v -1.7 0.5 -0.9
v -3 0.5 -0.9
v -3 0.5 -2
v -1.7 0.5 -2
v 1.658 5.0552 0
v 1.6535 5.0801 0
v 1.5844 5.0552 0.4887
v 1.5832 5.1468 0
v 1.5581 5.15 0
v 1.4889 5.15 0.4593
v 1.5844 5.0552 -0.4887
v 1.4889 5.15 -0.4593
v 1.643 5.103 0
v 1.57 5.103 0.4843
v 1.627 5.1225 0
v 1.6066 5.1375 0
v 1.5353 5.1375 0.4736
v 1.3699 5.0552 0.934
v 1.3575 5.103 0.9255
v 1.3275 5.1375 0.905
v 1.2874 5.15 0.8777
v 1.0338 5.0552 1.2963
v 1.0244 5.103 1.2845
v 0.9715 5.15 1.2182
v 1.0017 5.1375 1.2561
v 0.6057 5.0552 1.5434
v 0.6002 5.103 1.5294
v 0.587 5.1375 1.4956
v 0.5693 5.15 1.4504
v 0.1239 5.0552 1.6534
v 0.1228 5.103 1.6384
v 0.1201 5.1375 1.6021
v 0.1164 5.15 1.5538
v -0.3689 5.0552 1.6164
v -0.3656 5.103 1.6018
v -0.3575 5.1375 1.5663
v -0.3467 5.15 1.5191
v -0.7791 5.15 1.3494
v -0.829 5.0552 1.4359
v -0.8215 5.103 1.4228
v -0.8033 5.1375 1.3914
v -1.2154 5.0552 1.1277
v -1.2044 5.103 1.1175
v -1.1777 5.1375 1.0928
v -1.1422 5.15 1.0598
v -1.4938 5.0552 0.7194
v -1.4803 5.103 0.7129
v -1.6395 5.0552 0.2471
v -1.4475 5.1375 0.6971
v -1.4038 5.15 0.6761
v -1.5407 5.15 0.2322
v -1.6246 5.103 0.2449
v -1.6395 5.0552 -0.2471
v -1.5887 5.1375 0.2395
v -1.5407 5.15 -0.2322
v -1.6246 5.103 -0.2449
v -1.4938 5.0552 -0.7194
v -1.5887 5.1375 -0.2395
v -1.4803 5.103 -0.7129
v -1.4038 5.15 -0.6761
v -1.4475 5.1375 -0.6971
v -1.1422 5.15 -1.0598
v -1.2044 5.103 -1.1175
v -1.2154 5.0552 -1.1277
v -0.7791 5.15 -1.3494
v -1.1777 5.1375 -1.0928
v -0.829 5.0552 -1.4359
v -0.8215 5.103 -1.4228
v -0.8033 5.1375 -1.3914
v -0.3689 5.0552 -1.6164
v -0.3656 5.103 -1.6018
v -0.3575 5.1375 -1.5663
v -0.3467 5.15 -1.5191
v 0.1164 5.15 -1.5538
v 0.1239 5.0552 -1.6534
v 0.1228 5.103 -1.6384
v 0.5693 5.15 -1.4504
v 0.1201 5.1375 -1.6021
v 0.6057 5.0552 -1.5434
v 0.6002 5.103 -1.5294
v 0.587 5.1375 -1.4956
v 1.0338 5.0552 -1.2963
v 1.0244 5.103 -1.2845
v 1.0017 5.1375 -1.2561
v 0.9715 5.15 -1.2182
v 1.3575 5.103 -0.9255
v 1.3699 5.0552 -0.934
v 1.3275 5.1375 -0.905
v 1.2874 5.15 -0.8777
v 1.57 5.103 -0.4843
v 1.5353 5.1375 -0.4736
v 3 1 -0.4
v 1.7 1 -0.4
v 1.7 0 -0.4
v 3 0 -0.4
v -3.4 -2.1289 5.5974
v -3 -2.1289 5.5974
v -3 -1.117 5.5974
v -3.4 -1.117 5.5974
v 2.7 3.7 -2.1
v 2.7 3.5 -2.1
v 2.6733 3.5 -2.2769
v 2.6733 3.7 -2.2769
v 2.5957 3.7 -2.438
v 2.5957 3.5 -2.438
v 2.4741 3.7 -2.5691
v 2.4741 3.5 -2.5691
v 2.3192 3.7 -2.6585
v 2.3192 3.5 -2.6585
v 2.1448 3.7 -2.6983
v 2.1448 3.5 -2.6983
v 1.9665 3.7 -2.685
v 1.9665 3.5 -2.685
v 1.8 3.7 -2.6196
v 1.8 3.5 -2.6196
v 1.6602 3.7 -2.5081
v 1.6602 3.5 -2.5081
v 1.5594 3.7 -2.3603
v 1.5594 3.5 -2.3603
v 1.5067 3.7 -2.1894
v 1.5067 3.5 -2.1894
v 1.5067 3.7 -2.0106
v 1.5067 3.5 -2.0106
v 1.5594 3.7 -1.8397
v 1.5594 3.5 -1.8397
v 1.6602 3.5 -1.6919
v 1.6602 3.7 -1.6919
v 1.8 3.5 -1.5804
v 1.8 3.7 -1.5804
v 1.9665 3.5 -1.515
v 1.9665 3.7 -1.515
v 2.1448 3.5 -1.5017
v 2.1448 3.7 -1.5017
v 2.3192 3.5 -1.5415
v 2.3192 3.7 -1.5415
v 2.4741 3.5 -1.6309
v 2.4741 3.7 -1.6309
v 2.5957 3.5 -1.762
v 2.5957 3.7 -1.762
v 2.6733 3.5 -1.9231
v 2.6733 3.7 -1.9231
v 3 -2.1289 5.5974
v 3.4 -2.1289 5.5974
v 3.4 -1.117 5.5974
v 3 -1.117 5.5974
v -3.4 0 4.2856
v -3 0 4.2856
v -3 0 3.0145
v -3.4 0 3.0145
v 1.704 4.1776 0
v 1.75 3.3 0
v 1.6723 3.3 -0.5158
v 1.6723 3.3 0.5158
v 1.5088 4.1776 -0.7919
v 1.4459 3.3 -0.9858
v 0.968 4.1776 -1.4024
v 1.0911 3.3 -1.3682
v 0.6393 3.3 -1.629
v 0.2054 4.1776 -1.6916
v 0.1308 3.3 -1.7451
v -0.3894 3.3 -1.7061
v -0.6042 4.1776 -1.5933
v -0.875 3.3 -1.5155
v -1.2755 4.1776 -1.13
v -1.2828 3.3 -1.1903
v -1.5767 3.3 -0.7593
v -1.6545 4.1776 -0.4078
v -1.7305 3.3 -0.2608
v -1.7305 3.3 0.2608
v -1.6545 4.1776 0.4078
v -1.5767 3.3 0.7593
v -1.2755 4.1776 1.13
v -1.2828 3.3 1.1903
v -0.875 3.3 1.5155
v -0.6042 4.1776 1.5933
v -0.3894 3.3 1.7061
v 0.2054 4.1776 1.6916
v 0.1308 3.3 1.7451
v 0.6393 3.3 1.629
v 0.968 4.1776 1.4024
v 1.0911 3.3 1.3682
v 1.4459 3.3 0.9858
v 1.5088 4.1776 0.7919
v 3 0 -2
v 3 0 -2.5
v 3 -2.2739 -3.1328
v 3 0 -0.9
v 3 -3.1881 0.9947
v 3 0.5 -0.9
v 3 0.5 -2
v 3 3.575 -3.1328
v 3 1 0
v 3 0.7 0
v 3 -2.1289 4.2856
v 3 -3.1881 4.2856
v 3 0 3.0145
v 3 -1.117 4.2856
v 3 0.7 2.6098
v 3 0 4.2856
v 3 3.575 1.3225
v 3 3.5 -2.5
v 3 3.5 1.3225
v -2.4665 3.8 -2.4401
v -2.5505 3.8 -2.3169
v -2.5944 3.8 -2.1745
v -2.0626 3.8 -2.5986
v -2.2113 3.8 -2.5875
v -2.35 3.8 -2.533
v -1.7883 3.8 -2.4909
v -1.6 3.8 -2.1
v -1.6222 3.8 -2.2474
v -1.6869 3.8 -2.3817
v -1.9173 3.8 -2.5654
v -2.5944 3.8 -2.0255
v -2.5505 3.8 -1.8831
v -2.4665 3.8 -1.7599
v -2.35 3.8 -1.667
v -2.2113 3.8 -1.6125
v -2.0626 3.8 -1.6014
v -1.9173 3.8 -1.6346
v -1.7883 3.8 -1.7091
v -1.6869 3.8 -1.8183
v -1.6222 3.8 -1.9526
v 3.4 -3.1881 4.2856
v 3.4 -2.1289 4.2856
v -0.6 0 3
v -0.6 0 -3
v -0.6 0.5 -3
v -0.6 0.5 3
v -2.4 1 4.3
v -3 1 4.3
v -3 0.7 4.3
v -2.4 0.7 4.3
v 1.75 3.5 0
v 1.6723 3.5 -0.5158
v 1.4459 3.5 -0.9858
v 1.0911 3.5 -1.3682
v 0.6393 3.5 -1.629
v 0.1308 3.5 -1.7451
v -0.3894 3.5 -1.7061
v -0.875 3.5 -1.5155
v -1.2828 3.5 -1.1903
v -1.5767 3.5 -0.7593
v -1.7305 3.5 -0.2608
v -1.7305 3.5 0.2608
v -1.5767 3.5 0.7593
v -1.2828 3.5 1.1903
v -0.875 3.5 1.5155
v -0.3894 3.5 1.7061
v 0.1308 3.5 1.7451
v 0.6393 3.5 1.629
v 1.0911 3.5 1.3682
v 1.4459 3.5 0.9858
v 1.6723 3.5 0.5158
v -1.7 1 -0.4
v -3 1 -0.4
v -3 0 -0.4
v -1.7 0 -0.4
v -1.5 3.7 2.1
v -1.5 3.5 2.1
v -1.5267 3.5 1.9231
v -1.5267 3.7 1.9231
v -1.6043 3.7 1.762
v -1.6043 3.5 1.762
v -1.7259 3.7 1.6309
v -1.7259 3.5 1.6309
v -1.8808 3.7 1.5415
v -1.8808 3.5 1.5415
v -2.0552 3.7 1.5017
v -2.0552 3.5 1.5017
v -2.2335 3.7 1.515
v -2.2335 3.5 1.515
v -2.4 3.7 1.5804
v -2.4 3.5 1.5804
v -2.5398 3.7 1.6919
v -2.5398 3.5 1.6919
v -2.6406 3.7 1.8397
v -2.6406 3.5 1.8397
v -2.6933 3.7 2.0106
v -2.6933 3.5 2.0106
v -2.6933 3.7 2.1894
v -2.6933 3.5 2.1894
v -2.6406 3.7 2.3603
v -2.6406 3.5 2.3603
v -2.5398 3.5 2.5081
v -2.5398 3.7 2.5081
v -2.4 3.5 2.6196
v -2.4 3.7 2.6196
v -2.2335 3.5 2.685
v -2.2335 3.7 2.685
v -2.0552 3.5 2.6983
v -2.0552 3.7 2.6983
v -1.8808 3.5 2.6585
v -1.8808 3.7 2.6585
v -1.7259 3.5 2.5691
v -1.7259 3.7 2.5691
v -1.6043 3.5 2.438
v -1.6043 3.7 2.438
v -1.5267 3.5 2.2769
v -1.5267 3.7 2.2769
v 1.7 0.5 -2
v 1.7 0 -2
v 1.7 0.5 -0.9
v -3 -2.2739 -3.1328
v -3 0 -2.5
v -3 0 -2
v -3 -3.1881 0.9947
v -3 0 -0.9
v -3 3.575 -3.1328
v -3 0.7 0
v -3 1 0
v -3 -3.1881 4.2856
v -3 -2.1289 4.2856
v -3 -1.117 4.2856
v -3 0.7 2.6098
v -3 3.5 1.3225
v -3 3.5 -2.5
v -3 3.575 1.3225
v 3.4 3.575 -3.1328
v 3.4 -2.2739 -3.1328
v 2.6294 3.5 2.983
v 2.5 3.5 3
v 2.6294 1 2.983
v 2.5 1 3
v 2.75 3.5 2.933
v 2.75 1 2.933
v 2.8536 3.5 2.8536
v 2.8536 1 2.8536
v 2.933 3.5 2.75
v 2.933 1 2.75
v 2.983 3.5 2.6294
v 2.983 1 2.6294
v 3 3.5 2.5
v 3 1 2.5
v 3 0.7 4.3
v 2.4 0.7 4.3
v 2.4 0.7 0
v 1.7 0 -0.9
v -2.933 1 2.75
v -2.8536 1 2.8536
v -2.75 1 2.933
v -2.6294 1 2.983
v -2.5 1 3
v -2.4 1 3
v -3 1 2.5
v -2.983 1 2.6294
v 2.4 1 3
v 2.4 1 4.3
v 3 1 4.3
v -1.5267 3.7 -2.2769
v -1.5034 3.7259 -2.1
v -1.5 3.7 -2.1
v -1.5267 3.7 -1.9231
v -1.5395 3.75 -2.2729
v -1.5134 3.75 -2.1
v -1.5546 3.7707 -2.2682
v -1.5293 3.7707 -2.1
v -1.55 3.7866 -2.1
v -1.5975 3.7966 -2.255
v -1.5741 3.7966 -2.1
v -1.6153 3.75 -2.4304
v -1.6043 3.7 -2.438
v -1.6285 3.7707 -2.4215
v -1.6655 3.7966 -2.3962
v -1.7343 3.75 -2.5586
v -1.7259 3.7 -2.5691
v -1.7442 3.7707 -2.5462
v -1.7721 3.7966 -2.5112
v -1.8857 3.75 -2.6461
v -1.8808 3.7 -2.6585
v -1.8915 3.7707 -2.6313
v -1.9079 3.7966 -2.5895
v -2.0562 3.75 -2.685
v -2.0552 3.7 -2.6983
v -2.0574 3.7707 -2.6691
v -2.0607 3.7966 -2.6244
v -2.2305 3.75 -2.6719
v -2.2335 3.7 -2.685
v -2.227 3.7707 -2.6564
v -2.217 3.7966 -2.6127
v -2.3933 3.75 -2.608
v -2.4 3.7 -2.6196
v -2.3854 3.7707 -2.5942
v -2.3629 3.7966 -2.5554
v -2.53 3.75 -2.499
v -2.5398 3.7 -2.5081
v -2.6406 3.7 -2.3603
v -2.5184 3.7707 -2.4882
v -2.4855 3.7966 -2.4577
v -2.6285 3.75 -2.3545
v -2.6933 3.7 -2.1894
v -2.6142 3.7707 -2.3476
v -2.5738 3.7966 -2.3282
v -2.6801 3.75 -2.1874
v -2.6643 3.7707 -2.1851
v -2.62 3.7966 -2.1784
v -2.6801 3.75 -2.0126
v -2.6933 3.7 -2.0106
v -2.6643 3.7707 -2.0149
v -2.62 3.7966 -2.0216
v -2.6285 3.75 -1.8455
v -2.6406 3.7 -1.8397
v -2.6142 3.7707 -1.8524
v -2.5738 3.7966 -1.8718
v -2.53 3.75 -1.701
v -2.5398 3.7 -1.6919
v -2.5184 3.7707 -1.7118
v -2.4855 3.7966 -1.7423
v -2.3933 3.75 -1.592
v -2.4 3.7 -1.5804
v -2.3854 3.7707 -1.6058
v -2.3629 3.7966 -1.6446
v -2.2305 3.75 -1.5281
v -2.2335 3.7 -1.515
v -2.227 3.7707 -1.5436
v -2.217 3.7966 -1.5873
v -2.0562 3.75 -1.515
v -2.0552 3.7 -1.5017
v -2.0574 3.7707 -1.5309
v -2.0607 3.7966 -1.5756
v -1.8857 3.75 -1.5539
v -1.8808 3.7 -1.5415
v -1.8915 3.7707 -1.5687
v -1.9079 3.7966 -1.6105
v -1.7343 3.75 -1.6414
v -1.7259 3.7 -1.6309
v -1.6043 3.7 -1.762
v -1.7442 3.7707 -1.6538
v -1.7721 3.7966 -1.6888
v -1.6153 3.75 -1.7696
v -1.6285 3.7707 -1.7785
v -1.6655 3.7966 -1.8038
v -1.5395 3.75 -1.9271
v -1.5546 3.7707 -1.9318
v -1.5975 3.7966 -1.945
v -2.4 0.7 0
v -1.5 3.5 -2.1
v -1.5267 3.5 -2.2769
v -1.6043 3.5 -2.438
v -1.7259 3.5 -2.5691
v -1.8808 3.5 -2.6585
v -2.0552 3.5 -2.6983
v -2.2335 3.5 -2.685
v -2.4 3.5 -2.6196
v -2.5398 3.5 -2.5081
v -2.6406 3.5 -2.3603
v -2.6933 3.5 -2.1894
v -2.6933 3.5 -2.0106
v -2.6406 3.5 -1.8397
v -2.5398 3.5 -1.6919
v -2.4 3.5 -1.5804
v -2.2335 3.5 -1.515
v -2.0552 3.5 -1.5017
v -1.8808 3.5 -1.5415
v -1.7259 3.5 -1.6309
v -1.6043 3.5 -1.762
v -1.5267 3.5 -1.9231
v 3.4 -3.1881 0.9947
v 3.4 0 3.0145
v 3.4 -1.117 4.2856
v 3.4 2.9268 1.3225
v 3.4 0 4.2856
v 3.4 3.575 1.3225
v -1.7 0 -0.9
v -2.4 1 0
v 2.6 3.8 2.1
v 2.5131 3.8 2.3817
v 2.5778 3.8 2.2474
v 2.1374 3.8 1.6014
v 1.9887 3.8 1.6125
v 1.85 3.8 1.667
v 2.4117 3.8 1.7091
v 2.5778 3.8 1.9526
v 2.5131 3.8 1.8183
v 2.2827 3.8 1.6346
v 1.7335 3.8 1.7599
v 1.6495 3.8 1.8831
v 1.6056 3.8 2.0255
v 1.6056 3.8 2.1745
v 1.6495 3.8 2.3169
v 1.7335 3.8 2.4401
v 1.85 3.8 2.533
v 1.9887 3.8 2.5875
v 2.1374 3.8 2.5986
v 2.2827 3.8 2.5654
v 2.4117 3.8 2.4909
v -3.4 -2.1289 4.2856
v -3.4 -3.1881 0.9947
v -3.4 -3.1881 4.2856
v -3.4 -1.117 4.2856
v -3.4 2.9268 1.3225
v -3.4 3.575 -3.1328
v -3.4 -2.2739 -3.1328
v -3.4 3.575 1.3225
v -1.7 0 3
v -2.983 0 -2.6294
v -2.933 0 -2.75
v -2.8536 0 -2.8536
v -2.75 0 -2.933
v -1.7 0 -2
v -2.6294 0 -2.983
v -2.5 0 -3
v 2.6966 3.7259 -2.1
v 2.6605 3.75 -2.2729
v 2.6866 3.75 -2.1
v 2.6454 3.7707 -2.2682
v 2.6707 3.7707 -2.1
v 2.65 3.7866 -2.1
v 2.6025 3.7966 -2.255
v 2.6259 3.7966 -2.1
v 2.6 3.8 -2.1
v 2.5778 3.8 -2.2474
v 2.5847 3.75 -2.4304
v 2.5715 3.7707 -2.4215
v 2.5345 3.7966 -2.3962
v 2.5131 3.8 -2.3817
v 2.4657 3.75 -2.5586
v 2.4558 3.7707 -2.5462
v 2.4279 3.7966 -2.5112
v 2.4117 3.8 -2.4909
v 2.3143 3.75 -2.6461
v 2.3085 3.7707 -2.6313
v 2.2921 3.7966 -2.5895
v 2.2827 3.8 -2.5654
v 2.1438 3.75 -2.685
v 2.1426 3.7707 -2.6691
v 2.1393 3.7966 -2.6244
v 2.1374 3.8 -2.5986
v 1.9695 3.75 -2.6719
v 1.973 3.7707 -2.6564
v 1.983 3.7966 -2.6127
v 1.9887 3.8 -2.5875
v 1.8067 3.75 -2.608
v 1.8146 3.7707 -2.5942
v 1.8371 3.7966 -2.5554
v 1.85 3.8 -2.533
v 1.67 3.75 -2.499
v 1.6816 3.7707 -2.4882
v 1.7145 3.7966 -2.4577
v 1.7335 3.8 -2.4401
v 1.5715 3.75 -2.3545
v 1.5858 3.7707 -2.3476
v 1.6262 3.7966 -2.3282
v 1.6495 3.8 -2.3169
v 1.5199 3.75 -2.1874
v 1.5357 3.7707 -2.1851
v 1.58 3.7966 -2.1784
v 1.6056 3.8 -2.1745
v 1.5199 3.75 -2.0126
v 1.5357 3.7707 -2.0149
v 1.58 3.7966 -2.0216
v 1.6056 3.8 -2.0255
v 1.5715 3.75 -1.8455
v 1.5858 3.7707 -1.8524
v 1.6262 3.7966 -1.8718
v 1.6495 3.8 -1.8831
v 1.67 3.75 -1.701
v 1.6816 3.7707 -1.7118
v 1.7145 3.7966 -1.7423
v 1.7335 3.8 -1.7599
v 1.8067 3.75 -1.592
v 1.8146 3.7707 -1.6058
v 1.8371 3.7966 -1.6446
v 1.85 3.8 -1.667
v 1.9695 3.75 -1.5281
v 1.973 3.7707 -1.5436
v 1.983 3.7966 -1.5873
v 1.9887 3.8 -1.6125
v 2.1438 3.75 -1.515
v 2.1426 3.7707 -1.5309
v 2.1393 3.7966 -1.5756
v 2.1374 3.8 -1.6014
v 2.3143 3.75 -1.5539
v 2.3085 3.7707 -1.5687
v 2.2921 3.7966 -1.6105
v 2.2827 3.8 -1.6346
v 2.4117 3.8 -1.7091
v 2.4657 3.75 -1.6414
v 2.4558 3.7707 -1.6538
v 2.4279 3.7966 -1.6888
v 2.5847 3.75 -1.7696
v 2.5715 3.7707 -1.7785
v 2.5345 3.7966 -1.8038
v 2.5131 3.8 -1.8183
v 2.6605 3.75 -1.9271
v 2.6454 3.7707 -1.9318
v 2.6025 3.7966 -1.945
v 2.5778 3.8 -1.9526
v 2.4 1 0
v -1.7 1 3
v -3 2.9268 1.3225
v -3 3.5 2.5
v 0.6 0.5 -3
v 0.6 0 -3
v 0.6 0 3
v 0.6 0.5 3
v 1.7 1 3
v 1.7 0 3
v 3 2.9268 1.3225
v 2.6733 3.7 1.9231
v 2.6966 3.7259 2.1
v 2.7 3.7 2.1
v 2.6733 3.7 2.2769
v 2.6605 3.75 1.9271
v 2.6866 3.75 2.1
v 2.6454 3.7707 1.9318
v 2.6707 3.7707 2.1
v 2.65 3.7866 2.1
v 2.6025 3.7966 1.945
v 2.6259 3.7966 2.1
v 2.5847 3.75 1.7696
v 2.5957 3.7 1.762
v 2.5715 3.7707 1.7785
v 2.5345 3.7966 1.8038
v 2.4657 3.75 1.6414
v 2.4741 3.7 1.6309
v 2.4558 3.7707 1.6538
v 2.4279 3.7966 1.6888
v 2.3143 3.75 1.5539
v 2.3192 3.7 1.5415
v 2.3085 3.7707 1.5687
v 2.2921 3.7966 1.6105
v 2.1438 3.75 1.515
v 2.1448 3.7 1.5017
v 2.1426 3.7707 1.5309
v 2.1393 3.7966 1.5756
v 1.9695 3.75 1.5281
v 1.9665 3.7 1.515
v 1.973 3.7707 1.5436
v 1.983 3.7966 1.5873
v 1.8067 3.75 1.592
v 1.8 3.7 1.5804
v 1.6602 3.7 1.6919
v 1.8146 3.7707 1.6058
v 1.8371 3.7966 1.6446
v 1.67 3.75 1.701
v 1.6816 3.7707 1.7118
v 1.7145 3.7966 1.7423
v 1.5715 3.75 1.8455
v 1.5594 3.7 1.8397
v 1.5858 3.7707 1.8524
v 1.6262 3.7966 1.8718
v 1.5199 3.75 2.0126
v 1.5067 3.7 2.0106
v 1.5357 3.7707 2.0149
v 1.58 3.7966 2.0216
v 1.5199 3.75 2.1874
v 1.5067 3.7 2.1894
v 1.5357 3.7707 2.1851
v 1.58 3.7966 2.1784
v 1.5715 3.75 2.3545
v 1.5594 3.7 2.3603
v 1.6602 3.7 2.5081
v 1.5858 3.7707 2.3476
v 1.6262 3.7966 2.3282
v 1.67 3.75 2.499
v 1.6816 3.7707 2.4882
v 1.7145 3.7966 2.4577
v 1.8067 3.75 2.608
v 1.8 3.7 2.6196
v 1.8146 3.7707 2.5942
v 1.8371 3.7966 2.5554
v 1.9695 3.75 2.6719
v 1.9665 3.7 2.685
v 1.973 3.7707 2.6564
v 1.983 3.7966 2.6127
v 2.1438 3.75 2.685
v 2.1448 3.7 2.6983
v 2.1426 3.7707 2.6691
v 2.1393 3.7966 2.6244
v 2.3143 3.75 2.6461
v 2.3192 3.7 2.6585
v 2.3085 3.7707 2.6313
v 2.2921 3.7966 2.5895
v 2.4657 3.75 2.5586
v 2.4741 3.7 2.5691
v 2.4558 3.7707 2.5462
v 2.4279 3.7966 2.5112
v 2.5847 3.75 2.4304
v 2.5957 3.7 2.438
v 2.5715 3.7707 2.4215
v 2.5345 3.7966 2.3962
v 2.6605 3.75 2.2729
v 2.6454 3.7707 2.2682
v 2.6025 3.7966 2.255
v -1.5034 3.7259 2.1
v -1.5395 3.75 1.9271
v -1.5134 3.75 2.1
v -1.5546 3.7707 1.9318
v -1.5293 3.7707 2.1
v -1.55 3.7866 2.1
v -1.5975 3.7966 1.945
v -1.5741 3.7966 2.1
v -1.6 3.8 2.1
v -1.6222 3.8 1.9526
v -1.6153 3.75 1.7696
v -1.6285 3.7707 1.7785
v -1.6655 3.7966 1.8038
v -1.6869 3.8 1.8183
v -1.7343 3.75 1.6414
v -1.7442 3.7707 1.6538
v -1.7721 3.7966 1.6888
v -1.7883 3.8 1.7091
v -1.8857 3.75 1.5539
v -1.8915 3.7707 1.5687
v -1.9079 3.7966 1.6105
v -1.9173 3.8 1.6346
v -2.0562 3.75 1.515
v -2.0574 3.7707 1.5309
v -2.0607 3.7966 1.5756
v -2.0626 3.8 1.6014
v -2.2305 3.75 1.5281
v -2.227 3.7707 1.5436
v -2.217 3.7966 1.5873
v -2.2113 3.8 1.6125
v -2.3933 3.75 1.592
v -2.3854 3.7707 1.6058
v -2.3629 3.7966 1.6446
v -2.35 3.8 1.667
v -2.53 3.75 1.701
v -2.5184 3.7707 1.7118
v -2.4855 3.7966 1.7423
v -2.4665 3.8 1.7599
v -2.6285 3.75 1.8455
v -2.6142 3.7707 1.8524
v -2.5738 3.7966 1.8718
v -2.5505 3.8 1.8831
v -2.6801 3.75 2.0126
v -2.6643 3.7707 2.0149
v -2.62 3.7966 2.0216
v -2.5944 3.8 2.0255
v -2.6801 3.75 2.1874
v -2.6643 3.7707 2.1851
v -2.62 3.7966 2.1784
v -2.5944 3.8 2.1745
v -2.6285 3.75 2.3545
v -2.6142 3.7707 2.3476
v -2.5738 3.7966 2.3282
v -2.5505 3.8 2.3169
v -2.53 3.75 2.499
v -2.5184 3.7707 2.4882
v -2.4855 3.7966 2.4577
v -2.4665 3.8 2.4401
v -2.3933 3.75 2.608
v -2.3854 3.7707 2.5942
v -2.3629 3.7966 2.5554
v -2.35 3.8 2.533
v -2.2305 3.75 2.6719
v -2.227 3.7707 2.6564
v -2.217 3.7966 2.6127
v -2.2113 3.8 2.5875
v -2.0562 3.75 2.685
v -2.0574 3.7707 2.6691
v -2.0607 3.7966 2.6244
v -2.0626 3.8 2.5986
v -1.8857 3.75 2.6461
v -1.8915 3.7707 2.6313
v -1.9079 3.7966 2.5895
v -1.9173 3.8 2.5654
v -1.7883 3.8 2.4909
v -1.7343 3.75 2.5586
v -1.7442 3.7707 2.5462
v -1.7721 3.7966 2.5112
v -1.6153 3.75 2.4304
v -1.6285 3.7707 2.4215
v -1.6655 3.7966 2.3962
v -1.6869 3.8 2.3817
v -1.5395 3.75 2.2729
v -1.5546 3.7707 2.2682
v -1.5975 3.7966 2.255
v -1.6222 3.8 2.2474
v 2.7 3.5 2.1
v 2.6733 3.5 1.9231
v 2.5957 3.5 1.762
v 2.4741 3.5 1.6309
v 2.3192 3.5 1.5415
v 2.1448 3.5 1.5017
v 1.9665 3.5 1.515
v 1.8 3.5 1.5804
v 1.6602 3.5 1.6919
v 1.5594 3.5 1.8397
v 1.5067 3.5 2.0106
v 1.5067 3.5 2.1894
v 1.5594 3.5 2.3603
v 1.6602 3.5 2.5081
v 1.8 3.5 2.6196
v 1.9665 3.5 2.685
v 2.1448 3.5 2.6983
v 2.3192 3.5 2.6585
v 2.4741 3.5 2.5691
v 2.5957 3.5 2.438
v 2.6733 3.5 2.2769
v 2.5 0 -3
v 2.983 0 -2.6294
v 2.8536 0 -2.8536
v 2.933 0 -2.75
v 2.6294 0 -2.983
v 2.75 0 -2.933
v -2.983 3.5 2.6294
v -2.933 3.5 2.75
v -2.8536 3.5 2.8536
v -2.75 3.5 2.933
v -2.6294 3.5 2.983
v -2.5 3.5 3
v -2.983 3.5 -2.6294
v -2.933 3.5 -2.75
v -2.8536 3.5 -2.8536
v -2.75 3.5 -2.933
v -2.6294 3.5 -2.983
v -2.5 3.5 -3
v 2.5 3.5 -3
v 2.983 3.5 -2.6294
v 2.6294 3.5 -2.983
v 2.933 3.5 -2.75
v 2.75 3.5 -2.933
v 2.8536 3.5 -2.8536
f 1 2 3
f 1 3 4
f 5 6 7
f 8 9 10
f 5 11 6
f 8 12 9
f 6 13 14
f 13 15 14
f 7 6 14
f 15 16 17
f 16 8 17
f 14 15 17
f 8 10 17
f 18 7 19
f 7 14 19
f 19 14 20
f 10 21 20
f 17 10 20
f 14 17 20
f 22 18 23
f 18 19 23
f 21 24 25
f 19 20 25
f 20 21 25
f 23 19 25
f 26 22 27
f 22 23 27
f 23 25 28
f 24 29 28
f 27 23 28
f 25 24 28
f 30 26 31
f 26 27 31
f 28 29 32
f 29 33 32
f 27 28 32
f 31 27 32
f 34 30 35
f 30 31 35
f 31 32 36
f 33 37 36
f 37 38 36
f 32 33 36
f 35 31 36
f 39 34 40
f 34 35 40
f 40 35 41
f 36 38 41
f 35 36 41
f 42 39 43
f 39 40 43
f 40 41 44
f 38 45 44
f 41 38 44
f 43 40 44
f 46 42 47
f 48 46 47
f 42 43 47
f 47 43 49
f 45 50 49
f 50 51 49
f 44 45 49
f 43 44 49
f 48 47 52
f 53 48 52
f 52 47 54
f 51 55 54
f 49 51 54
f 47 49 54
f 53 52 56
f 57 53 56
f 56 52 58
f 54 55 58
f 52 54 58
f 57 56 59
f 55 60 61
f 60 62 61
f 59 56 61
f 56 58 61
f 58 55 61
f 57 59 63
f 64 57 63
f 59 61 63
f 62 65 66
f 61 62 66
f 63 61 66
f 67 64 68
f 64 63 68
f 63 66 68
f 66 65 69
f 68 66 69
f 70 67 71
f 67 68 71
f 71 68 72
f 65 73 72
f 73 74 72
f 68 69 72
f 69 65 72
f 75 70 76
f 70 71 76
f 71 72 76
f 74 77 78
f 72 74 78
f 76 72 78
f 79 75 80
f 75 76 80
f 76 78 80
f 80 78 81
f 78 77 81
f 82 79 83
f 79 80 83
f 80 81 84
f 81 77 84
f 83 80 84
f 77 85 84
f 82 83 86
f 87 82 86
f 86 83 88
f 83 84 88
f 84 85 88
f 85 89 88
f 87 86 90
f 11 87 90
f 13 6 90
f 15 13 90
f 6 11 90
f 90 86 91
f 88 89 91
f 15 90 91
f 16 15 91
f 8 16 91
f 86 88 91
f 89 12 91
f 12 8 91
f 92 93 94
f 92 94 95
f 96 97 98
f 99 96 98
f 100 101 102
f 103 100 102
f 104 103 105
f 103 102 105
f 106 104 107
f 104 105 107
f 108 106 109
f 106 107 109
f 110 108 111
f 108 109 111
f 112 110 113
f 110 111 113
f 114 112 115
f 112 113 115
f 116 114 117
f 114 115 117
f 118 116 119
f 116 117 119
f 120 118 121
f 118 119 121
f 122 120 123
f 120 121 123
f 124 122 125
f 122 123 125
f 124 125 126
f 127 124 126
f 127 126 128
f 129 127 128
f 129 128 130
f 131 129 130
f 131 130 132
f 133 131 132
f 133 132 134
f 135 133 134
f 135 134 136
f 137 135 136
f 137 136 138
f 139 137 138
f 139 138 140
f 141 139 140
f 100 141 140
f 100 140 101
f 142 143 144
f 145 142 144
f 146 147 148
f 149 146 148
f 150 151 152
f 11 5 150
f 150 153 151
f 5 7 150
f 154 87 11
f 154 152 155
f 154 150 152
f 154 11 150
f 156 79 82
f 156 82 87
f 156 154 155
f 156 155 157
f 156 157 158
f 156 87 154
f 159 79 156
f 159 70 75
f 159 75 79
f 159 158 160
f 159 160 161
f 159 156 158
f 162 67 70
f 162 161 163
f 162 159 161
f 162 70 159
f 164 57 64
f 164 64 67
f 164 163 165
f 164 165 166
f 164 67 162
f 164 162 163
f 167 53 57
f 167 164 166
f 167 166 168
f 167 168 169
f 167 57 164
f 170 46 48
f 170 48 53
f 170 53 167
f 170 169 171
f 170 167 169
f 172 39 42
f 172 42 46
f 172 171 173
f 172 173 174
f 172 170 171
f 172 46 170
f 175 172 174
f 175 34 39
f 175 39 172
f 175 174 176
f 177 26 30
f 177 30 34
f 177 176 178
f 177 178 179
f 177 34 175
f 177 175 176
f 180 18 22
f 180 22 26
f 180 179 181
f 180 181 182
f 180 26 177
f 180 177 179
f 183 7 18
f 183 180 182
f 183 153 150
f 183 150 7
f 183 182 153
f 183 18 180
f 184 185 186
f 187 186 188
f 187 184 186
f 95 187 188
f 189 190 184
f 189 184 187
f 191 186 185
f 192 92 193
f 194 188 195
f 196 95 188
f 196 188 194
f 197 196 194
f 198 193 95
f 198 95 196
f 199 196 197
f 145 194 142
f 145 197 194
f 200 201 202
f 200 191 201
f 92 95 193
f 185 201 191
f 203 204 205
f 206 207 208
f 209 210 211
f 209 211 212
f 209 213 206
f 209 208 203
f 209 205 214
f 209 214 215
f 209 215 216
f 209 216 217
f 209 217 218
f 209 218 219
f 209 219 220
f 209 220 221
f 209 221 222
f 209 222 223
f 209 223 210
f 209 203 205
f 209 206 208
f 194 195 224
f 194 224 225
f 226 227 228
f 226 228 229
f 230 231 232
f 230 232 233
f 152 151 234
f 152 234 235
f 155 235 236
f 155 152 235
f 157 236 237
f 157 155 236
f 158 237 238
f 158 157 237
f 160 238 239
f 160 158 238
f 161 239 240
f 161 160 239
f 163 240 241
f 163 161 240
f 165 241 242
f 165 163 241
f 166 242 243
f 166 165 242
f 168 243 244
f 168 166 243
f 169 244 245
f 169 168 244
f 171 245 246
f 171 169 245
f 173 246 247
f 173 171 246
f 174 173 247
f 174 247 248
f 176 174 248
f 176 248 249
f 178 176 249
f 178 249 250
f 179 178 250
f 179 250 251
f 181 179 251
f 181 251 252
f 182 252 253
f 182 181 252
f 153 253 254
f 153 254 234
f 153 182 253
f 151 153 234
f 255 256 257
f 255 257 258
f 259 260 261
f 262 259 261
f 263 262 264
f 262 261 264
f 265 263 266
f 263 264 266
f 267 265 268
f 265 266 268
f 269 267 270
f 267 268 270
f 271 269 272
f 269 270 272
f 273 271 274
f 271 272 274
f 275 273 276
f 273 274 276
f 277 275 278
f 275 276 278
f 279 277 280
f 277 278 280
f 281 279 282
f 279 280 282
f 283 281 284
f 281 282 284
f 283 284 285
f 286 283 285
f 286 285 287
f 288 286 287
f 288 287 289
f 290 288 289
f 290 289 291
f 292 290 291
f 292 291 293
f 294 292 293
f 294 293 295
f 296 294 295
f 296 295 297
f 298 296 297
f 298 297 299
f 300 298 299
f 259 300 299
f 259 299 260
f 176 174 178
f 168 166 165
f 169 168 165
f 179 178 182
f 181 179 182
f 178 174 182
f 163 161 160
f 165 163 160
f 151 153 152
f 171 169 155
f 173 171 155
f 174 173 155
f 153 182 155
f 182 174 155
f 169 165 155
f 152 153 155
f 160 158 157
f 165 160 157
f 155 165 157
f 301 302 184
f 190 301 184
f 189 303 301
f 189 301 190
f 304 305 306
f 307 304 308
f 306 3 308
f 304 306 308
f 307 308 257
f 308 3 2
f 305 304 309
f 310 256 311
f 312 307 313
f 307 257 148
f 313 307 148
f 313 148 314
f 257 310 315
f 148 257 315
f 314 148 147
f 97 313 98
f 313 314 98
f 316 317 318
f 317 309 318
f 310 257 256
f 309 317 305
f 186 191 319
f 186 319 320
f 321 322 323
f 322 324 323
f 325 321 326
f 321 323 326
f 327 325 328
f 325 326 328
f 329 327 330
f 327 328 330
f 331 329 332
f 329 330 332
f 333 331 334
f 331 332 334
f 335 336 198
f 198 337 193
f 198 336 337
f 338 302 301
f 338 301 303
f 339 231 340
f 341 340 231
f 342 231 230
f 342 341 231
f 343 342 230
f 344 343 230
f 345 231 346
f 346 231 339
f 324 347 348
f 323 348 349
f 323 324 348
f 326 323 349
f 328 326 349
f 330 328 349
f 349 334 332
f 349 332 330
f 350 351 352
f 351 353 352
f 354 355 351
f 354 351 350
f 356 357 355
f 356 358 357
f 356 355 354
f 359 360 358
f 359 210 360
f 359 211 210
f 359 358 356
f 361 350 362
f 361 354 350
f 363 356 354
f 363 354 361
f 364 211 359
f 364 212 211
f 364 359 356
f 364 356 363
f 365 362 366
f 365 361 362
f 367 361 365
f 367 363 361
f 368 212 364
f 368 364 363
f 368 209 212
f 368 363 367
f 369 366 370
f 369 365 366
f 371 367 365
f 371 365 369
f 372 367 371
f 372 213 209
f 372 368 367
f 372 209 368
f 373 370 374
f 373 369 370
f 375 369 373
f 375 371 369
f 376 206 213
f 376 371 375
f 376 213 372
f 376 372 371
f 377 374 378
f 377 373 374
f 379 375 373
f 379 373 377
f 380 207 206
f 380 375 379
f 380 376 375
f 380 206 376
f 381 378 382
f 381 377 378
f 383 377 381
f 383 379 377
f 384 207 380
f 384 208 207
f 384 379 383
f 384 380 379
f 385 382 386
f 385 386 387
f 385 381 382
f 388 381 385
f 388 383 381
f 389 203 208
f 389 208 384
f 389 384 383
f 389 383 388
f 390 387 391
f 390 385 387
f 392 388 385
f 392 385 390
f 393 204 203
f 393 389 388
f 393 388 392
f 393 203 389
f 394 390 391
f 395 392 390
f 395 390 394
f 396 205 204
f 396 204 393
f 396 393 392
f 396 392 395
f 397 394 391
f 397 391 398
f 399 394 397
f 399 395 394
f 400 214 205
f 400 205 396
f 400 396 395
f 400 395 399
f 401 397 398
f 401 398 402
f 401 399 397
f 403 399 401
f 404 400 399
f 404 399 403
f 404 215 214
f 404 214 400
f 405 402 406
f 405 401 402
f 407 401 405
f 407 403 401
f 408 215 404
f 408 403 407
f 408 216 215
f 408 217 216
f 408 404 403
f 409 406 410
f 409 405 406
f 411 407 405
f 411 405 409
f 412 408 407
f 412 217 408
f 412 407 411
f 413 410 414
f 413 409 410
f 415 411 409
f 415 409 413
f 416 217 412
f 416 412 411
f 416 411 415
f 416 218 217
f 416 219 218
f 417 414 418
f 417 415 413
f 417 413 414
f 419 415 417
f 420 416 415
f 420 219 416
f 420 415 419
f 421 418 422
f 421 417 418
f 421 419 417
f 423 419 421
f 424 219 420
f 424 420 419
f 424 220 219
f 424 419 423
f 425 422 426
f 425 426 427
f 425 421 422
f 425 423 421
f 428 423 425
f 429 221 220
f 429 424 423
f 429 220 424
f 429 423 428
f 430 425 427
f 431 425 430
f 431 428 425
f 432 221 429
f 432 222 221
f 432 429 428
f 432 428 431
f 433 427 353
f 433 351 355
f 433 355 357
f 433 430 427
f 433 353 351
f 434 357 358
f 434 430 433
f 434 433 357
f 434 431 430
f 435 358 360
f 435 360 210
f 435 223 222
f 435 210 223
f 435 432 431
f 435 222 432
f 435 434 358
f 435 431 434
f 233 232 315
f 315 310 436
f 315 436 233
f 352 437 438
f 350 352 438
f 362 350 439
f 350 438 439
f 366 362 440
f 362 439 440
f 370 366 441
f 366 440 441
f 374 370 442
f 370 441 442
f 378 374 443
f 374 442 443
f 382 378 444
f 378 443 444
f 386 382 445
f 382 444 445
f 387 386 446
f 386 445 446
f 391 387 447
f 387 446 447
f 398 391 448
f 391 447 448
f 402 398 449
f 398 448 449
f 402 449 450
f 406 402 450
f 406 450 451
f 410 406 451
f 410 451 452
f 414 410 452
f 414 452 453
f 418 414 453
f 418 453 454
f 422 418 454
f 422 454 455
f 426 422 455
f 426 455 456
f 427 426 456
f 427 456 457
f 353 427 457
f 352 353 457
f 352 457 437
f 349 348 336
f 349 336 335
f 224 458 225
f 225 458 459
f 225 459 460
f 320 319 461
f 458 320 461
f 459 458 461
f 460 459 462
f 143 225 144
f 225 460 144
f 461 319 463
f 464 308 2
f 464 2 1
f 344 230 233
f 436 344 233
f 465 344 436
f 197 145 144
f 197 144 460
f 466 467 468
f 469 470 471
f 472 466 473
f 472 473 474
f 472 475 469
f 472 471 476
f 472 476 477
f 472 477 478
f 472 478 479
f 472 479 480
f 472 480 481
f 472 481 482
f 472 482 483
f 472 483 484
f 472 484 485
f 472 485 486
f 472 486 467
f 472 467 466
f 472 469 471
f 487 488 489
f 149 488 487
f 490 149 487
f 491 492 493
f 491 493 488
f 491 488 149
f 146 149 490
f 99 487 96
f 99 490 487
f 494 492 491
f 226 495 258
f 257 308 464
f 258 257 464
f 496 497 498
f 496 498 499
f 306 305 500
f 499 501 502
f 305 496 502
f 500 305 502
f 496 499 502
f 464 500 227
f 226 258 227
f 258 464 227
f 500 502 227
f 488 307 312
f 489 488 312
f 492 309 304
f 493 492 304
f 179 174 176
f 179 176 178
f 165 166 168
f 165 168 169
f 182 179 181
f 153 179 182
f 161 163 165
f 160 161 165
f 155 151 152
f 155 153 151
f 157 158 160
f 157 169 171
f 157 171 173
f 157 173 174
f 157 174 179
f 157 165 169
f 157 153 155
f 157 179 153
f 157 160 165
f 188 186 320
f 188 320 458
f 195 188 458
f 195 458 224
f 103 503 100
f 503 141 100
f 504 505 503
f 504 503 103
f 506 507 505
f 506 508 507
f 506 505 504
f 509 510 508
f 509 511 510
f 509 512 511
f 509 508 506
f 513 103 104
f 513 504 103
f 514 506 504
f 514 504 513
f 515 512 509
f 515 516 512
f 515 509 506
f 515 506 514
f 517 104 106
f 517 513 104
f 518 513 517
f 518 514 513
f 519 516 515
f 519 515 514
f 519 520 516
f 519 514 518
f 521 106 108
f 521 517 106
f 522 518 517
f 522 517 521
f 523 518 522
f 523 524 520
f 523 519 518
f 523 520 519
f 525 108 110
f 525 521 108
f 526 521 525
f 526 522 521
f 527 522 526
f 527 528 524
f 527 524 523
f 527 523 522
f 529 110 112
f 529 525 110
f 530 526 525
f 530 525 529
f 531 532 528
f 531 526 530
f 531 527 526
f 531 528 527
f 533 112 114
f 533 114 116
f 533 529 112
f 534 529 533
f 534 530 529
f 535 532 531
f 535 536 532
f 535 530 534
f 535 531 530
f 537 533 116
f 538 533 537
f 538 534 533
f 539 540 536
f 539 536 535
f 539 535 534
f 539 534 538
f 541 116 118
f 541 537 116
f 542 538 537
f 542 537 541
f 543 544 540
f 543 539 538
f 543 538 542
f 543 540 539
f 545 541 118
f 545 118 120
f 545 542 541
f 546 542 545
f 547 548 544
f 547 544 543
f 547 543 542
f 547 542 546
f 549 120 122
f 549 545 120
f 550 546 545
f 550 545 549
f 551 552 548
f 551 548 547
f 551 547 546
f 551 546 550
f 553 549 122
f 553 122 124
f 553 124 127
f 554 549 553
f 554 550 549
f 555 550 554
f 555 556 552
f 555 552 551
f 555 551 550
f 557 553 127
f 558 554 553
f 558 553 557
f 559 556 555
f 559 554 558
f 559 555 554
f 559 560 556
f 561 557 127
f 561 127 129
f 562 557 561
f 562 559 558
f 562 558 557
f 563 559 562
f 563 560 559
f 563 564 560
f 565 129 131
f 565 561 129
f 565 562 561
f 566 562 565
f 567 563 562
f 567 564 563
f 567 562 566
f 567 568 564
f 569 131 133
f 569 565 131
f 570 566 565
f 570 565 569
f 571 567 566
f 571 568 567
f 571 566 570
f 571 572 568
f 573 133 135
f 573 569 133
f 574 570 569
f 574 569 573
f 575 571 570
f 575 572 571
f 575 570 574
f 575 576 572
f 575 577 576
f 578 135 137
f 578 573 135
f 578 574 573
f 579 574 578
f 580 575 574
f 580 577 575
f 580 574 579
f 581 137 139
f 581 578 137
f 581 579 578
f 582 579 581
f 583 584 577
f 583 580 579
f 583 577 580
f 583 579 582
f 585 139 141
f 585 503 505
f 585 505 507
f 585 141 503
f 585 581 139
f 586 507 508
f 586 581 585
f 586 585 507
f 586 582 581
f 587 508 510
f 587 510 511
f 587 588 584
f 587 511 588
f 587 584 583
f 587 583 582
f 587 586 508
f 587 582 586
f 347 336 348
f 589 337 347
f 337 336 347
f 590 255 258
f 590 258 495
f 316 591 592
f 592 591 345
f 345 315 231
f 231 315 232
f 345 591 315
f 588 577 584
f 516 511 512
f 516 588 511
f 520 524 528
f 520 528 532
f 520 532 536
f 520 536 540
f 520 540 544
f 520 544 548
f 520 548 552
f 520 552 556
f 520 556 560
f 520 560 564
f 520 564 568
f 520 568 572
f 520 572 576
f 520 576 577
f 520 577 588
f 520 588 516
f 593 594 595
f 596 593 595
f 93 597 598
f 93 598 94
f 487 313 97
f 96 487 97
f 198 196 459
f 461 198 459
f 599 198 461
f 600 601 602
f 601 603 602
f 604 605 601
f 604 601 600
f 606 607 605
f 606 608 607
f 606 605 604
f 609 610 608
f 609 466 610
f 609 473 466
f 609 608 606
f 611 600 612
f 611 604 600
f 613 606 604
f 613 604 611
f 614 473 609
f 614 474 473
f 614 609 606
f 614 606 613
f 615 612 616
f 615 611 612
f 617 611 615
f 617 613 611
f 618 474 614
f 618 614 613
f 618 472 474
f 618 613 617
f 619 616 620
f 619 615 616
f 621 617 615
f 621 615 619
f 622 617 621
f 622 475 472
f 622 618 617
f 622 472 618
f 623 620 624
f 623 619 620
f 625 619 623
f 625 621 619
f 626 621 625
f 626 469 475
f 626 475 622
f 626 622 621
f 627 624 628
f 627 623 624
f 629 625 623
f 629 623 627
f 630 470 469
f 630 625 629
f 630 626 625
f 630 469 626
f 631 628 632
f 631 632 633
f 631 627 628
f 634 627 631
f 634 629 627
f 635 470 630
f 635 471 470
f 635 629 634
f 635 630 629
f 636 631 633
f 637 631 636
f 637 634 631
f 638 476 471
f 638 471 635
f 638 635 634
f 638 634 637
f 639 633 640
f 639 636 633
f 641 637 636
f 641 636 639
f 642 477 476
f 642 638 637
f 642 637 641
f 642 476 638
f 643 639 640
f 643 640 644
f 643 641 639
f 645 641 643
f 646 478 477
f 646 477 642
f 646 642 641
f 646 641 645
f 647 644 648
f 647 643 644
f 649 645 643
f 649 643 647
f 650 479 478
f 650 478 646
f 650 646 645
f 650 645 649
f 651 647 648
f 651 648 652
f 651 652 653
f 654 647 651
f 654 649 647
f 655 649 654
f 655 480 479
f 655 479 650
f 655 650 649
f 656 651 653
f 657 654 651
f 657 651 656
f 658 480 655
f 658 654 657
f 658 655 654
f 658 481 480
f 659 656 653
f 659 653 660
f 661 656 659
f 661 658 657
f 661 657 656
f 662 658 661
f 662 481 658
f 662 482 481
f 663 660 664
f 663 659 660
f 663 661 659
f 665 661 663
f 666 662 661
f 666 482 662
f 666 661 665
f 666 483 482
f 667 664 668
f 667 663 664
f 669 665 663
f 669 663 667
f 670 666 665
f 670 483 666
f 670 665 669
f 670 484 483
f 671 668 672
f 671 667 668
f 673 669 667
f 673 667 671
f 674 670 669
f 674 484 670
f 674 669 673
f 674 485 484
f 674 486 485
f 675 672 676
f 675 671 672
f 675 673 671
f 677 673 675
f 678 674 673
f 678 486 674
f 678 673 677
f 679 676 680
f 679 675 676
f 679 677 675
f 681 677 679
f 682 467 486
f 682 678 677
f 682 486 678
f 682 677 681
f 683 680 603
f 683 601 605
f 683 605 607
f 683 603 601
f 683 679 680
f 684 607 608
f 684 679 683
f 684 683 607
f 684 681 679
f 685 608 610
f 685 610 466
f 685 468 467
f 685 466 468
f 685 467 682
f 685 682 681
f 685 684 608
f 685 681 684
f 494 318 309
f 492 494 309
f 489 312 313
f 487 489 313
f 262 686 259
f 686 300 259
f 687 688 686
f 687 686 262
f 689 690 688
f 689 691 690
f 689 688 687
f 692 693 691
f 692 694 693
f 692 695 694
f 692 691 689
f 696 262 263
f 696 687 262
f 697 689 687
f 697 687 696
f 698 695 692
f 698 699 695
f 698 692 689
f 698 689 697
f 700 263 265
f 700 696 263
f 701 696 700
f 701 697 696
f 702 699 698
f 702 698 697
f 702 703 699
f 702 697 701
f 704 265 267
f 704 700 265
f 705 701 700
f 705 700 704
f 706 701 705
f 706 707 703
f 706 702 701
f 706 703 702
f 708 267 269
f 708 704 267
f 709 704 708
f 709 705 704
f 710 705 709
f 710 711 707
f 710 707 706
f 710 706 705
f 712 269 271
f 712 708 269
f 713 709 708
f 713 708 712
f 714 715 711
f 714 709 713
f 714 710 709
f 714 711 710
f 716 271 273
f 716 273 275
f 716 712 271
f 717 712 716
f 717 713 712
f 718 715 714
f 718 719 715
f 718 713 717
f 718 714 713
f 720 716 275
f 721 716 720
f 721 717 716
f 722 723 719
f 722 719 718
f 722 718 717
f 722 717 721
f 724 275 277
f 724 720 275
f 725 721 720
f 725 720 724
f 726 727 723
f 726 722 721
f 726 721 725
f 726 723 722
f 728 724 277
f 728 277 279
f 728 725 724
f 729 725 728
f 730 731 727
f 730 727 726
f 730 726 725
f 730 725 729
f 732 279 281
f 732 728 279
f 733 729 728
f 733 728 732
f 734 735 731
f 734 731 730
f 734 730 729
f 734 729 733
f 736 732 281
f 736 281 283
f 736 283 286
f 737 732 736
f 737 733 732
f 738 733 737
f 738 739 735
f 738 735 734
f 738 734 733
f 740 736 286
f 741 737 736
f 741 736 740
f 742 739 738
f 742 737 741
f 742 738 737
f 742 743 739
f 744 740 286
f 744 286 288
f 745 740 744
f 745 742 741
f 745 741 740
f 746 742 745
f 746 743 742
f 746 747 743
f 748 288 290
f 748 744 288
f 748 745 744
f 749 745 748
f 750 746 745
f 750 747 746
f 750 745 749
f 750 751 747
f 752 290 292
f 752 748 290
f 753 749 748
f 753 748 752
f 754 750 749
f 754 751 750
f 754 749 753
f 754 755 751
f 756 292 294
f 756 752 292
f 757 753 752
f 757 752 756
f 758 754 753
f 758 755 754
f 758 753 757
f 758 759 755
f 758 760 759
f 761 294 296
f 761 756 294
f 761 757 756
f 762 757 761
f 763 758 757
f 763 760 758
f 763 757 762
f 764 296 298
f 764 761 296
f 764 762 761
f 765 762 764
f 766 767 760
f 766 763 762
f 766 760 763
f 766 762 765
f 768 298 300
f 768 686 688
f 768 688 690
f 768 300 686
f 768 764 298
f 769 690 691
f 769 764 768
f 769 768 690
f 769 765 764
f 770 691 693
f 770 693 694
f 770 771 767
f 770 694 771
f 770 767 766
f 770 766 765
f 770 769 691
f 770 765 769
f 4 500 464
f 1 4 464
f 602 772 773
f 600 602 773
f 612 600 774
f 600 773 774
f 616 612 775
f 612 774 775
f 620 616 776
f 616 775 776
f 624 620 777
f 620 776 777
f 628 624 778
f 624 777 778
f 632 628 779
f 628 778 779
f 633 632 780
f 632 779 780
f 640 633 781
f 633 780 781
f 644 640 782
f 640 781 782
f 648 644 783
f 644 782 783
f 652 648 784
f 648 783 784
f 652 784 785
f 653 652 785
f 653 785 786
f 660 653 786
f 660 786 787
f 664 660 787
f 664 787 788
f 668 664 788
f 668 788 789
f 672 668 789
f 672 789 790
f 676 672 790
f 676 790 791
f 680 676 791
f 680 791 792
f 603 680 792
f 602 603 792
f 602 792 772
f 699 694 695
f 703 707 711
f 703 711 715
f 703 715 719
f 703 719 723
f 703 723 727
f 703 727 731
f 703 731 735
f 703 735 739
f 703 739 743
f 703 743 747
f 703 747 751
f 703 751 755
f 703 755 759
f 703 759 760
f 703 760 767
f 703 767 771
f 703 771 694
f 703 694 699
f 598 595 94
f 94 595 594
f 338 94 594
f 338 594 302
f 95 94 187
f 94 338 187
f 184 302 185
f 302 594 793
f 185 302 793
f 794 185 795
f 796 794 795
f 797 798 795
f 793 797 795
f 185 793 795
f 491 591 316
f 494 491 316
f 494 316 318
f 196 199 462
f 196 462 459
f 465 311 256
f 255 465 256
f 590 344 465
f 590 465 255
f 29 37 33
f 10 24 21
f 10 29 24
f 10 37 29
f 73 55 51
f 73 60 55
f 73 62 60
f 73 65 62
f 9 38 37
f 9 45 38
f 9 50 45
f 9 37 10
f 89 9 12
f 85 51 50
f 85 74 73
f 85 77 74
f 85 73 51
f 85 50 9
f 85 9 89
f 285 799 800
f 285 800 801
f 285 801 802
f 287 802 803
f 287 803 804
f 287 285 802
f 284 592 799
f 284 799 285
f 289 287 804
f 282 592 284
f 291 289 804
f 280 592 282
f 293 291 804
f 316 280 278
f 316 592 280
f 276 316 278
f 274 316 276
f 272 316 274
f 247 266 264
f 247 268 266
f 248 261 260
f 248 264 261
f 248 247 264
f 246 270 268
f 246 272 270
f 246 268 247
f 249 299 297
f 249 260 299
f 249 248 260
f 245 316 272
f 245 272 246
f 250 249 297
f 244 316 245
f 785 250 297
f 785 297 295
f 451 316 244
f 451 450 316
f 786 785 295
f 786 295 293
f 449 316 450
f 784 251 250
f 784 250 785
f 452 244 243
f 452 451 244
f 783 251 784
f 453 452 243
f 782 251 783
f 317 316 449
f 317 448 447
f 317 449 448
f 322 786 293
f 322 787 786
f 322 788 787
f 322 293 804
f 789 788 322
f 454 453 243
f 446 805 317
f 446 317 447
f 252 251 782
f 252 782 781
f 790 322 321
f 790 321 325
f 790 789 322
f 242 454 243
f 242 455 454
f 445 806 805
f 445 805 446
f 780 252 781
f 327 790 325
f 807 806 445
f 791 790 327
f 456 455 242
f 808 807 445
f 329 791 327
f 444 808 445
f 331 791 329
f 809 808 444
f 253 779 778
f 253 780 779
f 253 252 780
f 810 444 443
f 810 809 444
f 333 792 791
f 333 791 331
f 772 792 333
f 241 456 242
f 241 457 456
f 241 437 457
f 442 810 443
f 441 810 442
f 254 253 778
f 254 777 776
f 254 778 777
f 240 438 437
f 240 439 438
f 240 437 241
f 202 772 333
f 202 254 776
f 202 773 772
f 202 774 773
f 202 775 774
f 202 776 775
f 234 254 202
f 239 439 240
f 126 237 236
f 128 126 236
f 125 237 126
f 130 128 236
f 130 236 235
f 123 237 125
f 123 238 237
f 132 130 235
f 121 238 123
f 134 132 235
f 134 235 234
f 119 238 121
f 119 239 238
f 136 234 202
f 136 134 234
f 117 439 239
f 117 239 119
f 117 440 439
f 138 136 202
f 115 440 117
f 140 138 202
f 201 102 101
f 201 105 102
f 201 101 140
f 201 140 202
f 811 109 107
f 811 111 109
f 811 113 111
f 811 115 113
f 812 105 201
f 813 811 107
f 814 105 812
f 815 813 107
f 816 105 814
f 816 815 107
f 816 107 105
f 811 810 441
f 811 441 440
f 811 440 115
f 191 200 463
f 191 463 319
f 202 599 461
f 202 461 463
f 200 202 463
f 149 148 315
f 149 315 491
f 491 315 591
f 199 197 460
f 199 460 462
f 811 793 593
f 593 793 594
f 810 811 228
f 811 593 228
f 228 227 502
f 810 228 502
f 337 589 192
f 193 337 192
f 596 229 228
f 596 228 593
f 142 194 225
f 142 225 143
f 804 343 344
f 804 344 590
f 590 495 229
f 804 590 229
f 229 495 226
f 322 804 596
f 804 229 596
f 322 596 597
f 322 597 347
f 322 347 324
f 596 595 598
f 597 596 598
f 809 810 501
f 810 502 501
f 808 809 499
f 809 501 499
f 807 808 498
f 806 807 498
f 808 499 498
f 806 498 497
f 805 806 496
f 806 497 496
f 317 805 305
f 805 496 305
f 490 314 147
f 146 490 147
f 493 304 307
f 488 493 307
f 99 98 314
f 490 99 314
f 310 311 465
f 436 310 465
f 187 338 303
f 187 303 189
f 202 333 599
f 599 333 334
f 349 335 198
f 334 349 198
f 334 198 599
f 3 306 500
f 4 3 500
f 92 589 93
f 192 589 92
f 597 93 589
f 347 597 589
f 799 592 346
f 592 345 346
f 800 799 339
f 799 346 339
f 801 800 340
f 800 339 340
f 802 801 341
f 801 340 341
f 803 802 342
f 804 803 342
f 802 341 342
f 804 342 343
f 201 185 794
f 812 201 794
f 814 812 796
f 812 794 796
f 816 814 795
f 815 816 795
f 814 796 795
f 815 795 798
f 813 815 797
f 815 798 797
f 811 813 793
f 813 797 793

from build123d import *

# Parameters (mm, degrees)
SKETCH1_W                 = 0.6
SKETCH1_H                 = 0.3
SKETCH1_R                 = 0.6
SKETCH1_R_2               = 1.75
BASE_DEPTH                = 3.3
TOP_START                 = 3.3
SKETCH1_3_R               = 0.6
SKETCH1_3_R_2             = 1.75
SKETCH1_3_W               = 0.6
SKETCH1_3_H               = 0.3
TOP_PLATE_DEPTH           = 0.2
KNOBS_START               = 3.3
SKETCH1_4_R               = 0.6
KNOBS_DEPTH               = 0.5
ACTUATOR_START            = 3.3
SKETCH1_5_R               = 1.75
ACTUATOR_DEPTH            = 1.85
ACTUATOR_TAPER            = 3
BASE_START                = -1
BASE_LEG_CUTOUT_DEPTH     = 1
SKETCH2_3_W               = 1.2
SKETCH2_3_H               = 6
SKETCH2_3_W_2             = 1.3
SKETCH2_3_H_2             = 1.1
BASE_SHALLOW_CUTOUT_DEPTH = 0.5
PINS_START                = 1
SKETCH1_7_W               = 0.6
SKETCH1_7_H               = 0.3
PINS_DEPTH                = 0.3
PINS_2_DEPTH              = 0.3
FILLET1_R                 = 0.1
FILLET2_R                 = 0.1
SKETCH4_W                 = 0.6
SKETCH4_H                 = 0.3
BOSS_EXTRUDE1_DEPTH       = 4
BOSS_EXTRUDE2_DEPTH       = 0.4
BOSS_EXTRUDE3_DEPTH       = 0.4
SKETCH8_W                 = 2.370971926
SKETCH8_H                 = 1.011910634
CUT_EXTRUDE1_DEPTH        = 1
CUT_EXTRUDE1_DEPTH_BACK   = 7.8


with BuildPart() as part:
    # Sketch1 → Base (new body)
    with BuildSketch(Plane(origin=(0, 0, 0), x_dir=(1, 0, 0), z_dir=(0, 1, 0))):
        with Locations((-2.7, -0.15)):
            Rectangle(SKETCH1_W, SKETCH1_H)
        with BuildLine():
            Line((2.5, 3), (-2.5, 3))
            ThreePointArc((-2.5, 3), (-2.853553391, 2.853553391), (-3, 2.5))
            Line((-3, 2.5), (-3, 0))
            Line((-3, 0), (-2.4, 0))
            Line((-2.4, 0), (-2.4, -0.3))
            Line((-2.4, -0.3), (-3, -0.3))
            Line((-3, -0.3), (-3, -2.5))
            ThreePointArc((-3, -2.5), (-2.853553391, -2.853553391), (-2.5, -3))
            Line((-2.5, -3), (2.5, -3))
            ThreePointArc((2.5, -3), (2.853553391, -2.853553391), (3, -2.5))
            Line((3, -2.5), (3, -0.3))
            Line((3, -0.3), (2.4, -0.3))
            Line((2.4, -0.3), (2.4, 0))
            Line((2.4, 0), (3, 0))
            Line((3, 0), (3, 2.5))
            ThreePointArc((3, 2.5), (2.853553391, 2.853553391), (2.5, 3))
        make_face()
        with Locations((-2.1, -2.1)):
            Circle(SKETCH1_R, mode=Mode.SUBTRACT)
        Circle(SKETCH1_R_2, mode=Mode.SUBTRACT)
        with Locations((2.1, -2.1)):
            Circle(SKETCH1_R, mode=Mode.SUBTRACT)
        with Locations((-2.1, 2.1)):
            Circle(SKETCH1_R, mode=Mode.SUBTRACT)
        with Locations((2.1, 2.1)):
            Circle(SKETCH1_R, mode=Mode.SUBTRACT)
        with Locations((-2.1, 2.1)):
            Circle(SKETCH1_R)
        with Locations((-2.1, -2.1)):
            Circle(SKETCH1_R)
        Circle(SKETCH1_R_2)
        with Locations((2.1, -2.1)):
            Circle(SKETCH1_R)
        with Locations((2.7, -0.15)):
            Rectangle(SKETCH1_W, SKETCH1_H)
        with Locations((2.1, 2.1)):
            Circle(SKETCH1_R)
    extrude(amount=BASE_DEPTH)

    # Sketch1<4> → Knobs (add)
    with BuildSketch(Plane(origin=(0, 0, 0), x_dir=(1, 0, 0), z_dir=(0, 1, 0)).offset(KNOBS_START)):
        with Locations((2.1, -2.1)):
            Circle(SKETCH1_4_R)
        with Locations((-2.1, -2.1)):
            Circle(SKETCH1_4_R)
        with Locations((-2.1, 2.1)):
            Circle(SKETCH1_4_R)
        with Locations((2.1, 2.1)):
            Circle(SKETCH1_4_R)
    extrude(amount=KNOBS_DEPTH)

    # Sketch2 → Base Leg Cutout (cut)
    with BuildSketch(Plane.XZ.offset(BASE_START)):
        with BuildLine():
            Line((-1.7, -0.4), (-1.7, 3))
            Line((-1.7, 3), (-2.5, 3))
            ThreePointArc((-2.5, 3), (-2.853553391, 2.853553391), (-3, 2.5))
            Line((-3, 2.5), (-3, -0.4))
            Line((-3, -0.4), (-1.7, -0.4))
        make_face()
        with BuildLine():
            Line((2.5, 3), (1.7, 3))
            Line((1.7, 3), (1.7, -0.4))
            Line((1.7, -0.4), (3, -0.4))
            Line((3, -0.4), (3, 2.5))
            ThreePointArc((3, 2.5), (2.853553391, 2.853553391), (2.5, 3))
        make_face()
    extrude(amount=BASE_LEG_CUTOUT_DEPTH, mode=Mode.SUBTRACT)

    # Sketch2<3> → Base Shallow Cutout (cut)
    with BuildSketch(Plane.XZ):
        Rectangle(SKETCH2_3_W, SKETCH2_3_H)
        with Locations((2.35, -1.45)):
            Rectangle(SKETCH2_3_W_2, SKETCH2_3_H_2)
        with Locations((-2.35, -1.45)):
            Rectangle(SKETCH2_3_W_2, SKETCH2_3_H_2)
    extrude(amount=-BASE_SHALLOW_CUTOUT_DEPTH, mode=Mode.SUBTRACT)

    # Fillet2
    fillet2_edges = [part.edges().sort_by_distance(p)[0] for p in [
        (1.5, 3.8, 2.1),
        (-2.7, 3.8, 2.1),
        (-2.7, 3.8, -2.1),
        (1.5, 3.8, -2.1),
    ]]
    fillet(fillet2_edges, radius=FILLET2_R)



with BuildPart() as body_2:
    # Sketch1<3> → Top Plate (new body)
    with BuildSketch(Plane(origin=(0, 0, 0), x_dir=(1, 0, 0), z_dir=(0, 1, 0)).offset(TOP_START)):
        with BuildLine():
            Line((2.5, 3), (-2.5, 3))
            ThreePointArc((-2.5, 3), (-2.853553391, 2.853553391), (-3, 2.5))
            Line((-3, 2.5), (-3, 0))
            Line((-3, 0), (-2.4, 0))
            Line((-2.4, 0), (-2.4, -0.3))
            Line((-2.4, -0.3), (-3, -0.3))
            Line((-3, -0.3), (-3, -2.5))
            ThreePointArc((-3, -2.5), (-2.853553391, -2.853553391), (-2.5, -3))
            Line((-2.5, -3), (2.5, -3))
            ThreePointArc((2.5, -3), (2.853553391, -2.853553391), (3, -2.5))
            Line((3, -2.5), (3, -0.3))
            Line((3, -0.3), (2.4, -0.3))
            Line((2.4, -0.3), (2.4, 0))
            Line((2.4, 0), (3, 0))
            Line((3, 0), (3, 2.5))
            ThreePointArc((3, 2.5), (2.853553391, 2.853553391), (2.5, 3))
        make_face()
        with Locations((-2.1, -2.1)):
            Circle(SKETCH1_3_R, mode=Mode.SUBTRACT)
        Circle(SKETCH1_3_R_2, mode=Mode.SUBTRACT)
        with Locations((2.1, -2.1)):
            Circle(SKETCH1_3_R, mode=Mode.SUBTRACT)
        with Locations((-2.1, 2.1)):
            Circle(SKETCH1_3_R, mode=Mode.SUBTRACT)
        with Locations((2.1, 2.1)):
            Circle(SKETCH1_3_R, mode=Mode.SUBTRACT)
        with Locations((2.7, -0.15)):
            Rectangle(SKETCH1_3_W, SKETCH1_3_H)
        with Locations((-2.7, -0.15)):
            Rectangle(SKETCH1_3_W, SKETCH1_3_H)
    extrude(amount=TOP_PLATE_DEPTH)


with BuildPart() as body_3:
    # Sketch1<5> → Actuator (new body)
    with BuildSketch(Plane(origin=(0, 0, 0), x_dir=(1, 0, 0), z_dir=(0, 1, 0)).offset(ACTUATOR_START)):
        Circle(SKETCH1_5_R)
    extrude(amount=ACTUATOR_DEPTH, taper=ACTUATOR_TAPER)

    # Fillet1
    fillet1_edges = [body_3.edges().sort_by_distance(p)[0] for p in [
        (-1.653045608, 5.15, 0),
    ]]
    fillet(fillet1_edges, radius=FILLET1_R)


with BuildPart() as body_4:
    # Sketch1<7> → Pins (new body)
    with BuildSketch(Plane(origin=(0, 0, 0), x_dir=(1, 0, 0), z_dir=(0, 1, 0)).offset(PINS_START)):
        with Locations((-2.7, -0.15)):
            Rectangle(SKETCH1_7_W, SKETCH1_7_H)
    extrude(amount=-PINS_DEPTH)


with BuildPart() as body_5:
    # Sketch1<7> → Pins 2 (new body)
    with BuildSketch(Plane(origin=(0, 0, 0), x_dir=(1, 0, 0), z_dir=(0, 1, 0)).offset(PINS_START)):
        with Locations((2.7, -0.15)):
            Rectangle(SKETCH1_7_W, SKETCH1_7_H)
    extrude(amount=-PINS_2_DEPTH)


with BuildPart() as part_1:
    add(part.part)

    add(body_4.part)  # Boss-Extrude1 merges body 4

    add(body_5.part)  # Boss-Extrude1 merges body 5
    # Sketch4 → Boss-Extrude1 (add)
    with BuildSketch(Plane.XY.offset(0.3)):
        with Locations((2.7, 0.85)):
            Rectangle(SKETCH4_W, SKETCH4_H)
        with Locations((-2.7, 0.85)):
            Rectangle(SKETCH4_W, SKETCH4_H)
    extrude(amount=BOSS_EXTRUDE1_DEPTH)


    add(body_2.part)  # Boss-Extrude2 merges body 2
    # Sketch6 → Boss-Extrude2 (add)
    with BuildSketch(Plane(origin=(3, 0, 0), x_dir=(0, 0, -1), z_dir=(1, 0, 0))):
        with BuildLine():
            Line((3.132840684, 3.575039622), (3.132840684, -2.273948021))
            Line((3.132840684, -2.273948021), (-0.994663761, -3.188082912))
            Line((-0.994663761, -3.188082912), (-4.285578573, -3.188082912))
            Line((-4.285578573, -3.188082912), (-4.285578573, -2.128896003))
            Line((-4.285578573, -2.128896003), (-7.462436516, -2.128896003))
            ThreePointArc((-7.462436516, -2.128896003), (-7.968391833, -1.622940686), (-7.462436516, -1.116985369))
            Line((-7.462436516, -1.116985369), (-4.285578573, -1.116985369))
            Line((-4.285578573, -1.116985369), (-4.285578573, 0))
            Line((-4.285578573, 0), (-3.014513822, 0))
            Line((-3.014513822, 0), (-1.322453077, 2.926827881))
            Line((-1.322453077, 2.926827881), (-1.322453077, 3.575039622))
            Line((-1.322453077, 3.575039622), (3.132840684, 3.575039622))
        make_face()
    extrude(amount=BOSS_EXTRUDE2_DEPTH)

    # Sketch7 → Boss-Extrude3 (add)
    with BuildSketch(Plane.ZY.offset(3)):
        with BuildLine():
            Line((1.322453077, 3.575039622), (-3.132840684, 3.575039622))
            Line((-3.132840684, 3.575039622), (-3.132840684, -2.273948021))
            Line((-3.132840684, -2.273948021), (0.994663761, -3.188082912))
            Line((0.994663761, -3.188082912), (4.285578573, -3.188082912))
            Line((4.285578573, -3.188082912), (4.285578573, -2.128896003))
            Line((4.285578573, -2.128896003), (7.462436516, -2.128896003))
            ThreePointArc((7.462436516, -2.128896003), (7.968391833, -1.622940686), (7.462436516, -1.116985369))
            Line((7.462436516, -1.116985369), (4.285578573, -1.116985369))
            Line((4.285578573, -1.116985369), (4.285578573, 0))
            Line((4.285578573, 0), (3.014513822, 0))
            Line((3.014513822, 0), (1.322453077, 2.926827881))
            Line((1.322453077, 2.926827881), (1.322453077, 3.575039622))
        make_face()
    extrude(amount=BOSS_EXTRUDE3_DEPTH)

    # Sketch8 → Cut-Extrude1 (cut, two sides)
    with BuildSketch(Plane(origin=(3.4, 0, 0), x_dir=(0, 0, -1), z_dir=(1, 0, 0))) as cut_extrude1_sk:
        with Locations((-6.78290587, -1.622940686)):
            Rectangle(SKETCH8_W, SKETCH8_H)
    extrude(amount=CUT_EXTRUDE1_DEPTH, mode=Mode.SUBTRACT)
    extrude(cut_extrude1_sk.sketch, amount=-CUT_EXTRUDE1_DEPTH_BACK, mode=Mode.SUBTRACT)


solid = Compound([body_3.part, part_1.part])
